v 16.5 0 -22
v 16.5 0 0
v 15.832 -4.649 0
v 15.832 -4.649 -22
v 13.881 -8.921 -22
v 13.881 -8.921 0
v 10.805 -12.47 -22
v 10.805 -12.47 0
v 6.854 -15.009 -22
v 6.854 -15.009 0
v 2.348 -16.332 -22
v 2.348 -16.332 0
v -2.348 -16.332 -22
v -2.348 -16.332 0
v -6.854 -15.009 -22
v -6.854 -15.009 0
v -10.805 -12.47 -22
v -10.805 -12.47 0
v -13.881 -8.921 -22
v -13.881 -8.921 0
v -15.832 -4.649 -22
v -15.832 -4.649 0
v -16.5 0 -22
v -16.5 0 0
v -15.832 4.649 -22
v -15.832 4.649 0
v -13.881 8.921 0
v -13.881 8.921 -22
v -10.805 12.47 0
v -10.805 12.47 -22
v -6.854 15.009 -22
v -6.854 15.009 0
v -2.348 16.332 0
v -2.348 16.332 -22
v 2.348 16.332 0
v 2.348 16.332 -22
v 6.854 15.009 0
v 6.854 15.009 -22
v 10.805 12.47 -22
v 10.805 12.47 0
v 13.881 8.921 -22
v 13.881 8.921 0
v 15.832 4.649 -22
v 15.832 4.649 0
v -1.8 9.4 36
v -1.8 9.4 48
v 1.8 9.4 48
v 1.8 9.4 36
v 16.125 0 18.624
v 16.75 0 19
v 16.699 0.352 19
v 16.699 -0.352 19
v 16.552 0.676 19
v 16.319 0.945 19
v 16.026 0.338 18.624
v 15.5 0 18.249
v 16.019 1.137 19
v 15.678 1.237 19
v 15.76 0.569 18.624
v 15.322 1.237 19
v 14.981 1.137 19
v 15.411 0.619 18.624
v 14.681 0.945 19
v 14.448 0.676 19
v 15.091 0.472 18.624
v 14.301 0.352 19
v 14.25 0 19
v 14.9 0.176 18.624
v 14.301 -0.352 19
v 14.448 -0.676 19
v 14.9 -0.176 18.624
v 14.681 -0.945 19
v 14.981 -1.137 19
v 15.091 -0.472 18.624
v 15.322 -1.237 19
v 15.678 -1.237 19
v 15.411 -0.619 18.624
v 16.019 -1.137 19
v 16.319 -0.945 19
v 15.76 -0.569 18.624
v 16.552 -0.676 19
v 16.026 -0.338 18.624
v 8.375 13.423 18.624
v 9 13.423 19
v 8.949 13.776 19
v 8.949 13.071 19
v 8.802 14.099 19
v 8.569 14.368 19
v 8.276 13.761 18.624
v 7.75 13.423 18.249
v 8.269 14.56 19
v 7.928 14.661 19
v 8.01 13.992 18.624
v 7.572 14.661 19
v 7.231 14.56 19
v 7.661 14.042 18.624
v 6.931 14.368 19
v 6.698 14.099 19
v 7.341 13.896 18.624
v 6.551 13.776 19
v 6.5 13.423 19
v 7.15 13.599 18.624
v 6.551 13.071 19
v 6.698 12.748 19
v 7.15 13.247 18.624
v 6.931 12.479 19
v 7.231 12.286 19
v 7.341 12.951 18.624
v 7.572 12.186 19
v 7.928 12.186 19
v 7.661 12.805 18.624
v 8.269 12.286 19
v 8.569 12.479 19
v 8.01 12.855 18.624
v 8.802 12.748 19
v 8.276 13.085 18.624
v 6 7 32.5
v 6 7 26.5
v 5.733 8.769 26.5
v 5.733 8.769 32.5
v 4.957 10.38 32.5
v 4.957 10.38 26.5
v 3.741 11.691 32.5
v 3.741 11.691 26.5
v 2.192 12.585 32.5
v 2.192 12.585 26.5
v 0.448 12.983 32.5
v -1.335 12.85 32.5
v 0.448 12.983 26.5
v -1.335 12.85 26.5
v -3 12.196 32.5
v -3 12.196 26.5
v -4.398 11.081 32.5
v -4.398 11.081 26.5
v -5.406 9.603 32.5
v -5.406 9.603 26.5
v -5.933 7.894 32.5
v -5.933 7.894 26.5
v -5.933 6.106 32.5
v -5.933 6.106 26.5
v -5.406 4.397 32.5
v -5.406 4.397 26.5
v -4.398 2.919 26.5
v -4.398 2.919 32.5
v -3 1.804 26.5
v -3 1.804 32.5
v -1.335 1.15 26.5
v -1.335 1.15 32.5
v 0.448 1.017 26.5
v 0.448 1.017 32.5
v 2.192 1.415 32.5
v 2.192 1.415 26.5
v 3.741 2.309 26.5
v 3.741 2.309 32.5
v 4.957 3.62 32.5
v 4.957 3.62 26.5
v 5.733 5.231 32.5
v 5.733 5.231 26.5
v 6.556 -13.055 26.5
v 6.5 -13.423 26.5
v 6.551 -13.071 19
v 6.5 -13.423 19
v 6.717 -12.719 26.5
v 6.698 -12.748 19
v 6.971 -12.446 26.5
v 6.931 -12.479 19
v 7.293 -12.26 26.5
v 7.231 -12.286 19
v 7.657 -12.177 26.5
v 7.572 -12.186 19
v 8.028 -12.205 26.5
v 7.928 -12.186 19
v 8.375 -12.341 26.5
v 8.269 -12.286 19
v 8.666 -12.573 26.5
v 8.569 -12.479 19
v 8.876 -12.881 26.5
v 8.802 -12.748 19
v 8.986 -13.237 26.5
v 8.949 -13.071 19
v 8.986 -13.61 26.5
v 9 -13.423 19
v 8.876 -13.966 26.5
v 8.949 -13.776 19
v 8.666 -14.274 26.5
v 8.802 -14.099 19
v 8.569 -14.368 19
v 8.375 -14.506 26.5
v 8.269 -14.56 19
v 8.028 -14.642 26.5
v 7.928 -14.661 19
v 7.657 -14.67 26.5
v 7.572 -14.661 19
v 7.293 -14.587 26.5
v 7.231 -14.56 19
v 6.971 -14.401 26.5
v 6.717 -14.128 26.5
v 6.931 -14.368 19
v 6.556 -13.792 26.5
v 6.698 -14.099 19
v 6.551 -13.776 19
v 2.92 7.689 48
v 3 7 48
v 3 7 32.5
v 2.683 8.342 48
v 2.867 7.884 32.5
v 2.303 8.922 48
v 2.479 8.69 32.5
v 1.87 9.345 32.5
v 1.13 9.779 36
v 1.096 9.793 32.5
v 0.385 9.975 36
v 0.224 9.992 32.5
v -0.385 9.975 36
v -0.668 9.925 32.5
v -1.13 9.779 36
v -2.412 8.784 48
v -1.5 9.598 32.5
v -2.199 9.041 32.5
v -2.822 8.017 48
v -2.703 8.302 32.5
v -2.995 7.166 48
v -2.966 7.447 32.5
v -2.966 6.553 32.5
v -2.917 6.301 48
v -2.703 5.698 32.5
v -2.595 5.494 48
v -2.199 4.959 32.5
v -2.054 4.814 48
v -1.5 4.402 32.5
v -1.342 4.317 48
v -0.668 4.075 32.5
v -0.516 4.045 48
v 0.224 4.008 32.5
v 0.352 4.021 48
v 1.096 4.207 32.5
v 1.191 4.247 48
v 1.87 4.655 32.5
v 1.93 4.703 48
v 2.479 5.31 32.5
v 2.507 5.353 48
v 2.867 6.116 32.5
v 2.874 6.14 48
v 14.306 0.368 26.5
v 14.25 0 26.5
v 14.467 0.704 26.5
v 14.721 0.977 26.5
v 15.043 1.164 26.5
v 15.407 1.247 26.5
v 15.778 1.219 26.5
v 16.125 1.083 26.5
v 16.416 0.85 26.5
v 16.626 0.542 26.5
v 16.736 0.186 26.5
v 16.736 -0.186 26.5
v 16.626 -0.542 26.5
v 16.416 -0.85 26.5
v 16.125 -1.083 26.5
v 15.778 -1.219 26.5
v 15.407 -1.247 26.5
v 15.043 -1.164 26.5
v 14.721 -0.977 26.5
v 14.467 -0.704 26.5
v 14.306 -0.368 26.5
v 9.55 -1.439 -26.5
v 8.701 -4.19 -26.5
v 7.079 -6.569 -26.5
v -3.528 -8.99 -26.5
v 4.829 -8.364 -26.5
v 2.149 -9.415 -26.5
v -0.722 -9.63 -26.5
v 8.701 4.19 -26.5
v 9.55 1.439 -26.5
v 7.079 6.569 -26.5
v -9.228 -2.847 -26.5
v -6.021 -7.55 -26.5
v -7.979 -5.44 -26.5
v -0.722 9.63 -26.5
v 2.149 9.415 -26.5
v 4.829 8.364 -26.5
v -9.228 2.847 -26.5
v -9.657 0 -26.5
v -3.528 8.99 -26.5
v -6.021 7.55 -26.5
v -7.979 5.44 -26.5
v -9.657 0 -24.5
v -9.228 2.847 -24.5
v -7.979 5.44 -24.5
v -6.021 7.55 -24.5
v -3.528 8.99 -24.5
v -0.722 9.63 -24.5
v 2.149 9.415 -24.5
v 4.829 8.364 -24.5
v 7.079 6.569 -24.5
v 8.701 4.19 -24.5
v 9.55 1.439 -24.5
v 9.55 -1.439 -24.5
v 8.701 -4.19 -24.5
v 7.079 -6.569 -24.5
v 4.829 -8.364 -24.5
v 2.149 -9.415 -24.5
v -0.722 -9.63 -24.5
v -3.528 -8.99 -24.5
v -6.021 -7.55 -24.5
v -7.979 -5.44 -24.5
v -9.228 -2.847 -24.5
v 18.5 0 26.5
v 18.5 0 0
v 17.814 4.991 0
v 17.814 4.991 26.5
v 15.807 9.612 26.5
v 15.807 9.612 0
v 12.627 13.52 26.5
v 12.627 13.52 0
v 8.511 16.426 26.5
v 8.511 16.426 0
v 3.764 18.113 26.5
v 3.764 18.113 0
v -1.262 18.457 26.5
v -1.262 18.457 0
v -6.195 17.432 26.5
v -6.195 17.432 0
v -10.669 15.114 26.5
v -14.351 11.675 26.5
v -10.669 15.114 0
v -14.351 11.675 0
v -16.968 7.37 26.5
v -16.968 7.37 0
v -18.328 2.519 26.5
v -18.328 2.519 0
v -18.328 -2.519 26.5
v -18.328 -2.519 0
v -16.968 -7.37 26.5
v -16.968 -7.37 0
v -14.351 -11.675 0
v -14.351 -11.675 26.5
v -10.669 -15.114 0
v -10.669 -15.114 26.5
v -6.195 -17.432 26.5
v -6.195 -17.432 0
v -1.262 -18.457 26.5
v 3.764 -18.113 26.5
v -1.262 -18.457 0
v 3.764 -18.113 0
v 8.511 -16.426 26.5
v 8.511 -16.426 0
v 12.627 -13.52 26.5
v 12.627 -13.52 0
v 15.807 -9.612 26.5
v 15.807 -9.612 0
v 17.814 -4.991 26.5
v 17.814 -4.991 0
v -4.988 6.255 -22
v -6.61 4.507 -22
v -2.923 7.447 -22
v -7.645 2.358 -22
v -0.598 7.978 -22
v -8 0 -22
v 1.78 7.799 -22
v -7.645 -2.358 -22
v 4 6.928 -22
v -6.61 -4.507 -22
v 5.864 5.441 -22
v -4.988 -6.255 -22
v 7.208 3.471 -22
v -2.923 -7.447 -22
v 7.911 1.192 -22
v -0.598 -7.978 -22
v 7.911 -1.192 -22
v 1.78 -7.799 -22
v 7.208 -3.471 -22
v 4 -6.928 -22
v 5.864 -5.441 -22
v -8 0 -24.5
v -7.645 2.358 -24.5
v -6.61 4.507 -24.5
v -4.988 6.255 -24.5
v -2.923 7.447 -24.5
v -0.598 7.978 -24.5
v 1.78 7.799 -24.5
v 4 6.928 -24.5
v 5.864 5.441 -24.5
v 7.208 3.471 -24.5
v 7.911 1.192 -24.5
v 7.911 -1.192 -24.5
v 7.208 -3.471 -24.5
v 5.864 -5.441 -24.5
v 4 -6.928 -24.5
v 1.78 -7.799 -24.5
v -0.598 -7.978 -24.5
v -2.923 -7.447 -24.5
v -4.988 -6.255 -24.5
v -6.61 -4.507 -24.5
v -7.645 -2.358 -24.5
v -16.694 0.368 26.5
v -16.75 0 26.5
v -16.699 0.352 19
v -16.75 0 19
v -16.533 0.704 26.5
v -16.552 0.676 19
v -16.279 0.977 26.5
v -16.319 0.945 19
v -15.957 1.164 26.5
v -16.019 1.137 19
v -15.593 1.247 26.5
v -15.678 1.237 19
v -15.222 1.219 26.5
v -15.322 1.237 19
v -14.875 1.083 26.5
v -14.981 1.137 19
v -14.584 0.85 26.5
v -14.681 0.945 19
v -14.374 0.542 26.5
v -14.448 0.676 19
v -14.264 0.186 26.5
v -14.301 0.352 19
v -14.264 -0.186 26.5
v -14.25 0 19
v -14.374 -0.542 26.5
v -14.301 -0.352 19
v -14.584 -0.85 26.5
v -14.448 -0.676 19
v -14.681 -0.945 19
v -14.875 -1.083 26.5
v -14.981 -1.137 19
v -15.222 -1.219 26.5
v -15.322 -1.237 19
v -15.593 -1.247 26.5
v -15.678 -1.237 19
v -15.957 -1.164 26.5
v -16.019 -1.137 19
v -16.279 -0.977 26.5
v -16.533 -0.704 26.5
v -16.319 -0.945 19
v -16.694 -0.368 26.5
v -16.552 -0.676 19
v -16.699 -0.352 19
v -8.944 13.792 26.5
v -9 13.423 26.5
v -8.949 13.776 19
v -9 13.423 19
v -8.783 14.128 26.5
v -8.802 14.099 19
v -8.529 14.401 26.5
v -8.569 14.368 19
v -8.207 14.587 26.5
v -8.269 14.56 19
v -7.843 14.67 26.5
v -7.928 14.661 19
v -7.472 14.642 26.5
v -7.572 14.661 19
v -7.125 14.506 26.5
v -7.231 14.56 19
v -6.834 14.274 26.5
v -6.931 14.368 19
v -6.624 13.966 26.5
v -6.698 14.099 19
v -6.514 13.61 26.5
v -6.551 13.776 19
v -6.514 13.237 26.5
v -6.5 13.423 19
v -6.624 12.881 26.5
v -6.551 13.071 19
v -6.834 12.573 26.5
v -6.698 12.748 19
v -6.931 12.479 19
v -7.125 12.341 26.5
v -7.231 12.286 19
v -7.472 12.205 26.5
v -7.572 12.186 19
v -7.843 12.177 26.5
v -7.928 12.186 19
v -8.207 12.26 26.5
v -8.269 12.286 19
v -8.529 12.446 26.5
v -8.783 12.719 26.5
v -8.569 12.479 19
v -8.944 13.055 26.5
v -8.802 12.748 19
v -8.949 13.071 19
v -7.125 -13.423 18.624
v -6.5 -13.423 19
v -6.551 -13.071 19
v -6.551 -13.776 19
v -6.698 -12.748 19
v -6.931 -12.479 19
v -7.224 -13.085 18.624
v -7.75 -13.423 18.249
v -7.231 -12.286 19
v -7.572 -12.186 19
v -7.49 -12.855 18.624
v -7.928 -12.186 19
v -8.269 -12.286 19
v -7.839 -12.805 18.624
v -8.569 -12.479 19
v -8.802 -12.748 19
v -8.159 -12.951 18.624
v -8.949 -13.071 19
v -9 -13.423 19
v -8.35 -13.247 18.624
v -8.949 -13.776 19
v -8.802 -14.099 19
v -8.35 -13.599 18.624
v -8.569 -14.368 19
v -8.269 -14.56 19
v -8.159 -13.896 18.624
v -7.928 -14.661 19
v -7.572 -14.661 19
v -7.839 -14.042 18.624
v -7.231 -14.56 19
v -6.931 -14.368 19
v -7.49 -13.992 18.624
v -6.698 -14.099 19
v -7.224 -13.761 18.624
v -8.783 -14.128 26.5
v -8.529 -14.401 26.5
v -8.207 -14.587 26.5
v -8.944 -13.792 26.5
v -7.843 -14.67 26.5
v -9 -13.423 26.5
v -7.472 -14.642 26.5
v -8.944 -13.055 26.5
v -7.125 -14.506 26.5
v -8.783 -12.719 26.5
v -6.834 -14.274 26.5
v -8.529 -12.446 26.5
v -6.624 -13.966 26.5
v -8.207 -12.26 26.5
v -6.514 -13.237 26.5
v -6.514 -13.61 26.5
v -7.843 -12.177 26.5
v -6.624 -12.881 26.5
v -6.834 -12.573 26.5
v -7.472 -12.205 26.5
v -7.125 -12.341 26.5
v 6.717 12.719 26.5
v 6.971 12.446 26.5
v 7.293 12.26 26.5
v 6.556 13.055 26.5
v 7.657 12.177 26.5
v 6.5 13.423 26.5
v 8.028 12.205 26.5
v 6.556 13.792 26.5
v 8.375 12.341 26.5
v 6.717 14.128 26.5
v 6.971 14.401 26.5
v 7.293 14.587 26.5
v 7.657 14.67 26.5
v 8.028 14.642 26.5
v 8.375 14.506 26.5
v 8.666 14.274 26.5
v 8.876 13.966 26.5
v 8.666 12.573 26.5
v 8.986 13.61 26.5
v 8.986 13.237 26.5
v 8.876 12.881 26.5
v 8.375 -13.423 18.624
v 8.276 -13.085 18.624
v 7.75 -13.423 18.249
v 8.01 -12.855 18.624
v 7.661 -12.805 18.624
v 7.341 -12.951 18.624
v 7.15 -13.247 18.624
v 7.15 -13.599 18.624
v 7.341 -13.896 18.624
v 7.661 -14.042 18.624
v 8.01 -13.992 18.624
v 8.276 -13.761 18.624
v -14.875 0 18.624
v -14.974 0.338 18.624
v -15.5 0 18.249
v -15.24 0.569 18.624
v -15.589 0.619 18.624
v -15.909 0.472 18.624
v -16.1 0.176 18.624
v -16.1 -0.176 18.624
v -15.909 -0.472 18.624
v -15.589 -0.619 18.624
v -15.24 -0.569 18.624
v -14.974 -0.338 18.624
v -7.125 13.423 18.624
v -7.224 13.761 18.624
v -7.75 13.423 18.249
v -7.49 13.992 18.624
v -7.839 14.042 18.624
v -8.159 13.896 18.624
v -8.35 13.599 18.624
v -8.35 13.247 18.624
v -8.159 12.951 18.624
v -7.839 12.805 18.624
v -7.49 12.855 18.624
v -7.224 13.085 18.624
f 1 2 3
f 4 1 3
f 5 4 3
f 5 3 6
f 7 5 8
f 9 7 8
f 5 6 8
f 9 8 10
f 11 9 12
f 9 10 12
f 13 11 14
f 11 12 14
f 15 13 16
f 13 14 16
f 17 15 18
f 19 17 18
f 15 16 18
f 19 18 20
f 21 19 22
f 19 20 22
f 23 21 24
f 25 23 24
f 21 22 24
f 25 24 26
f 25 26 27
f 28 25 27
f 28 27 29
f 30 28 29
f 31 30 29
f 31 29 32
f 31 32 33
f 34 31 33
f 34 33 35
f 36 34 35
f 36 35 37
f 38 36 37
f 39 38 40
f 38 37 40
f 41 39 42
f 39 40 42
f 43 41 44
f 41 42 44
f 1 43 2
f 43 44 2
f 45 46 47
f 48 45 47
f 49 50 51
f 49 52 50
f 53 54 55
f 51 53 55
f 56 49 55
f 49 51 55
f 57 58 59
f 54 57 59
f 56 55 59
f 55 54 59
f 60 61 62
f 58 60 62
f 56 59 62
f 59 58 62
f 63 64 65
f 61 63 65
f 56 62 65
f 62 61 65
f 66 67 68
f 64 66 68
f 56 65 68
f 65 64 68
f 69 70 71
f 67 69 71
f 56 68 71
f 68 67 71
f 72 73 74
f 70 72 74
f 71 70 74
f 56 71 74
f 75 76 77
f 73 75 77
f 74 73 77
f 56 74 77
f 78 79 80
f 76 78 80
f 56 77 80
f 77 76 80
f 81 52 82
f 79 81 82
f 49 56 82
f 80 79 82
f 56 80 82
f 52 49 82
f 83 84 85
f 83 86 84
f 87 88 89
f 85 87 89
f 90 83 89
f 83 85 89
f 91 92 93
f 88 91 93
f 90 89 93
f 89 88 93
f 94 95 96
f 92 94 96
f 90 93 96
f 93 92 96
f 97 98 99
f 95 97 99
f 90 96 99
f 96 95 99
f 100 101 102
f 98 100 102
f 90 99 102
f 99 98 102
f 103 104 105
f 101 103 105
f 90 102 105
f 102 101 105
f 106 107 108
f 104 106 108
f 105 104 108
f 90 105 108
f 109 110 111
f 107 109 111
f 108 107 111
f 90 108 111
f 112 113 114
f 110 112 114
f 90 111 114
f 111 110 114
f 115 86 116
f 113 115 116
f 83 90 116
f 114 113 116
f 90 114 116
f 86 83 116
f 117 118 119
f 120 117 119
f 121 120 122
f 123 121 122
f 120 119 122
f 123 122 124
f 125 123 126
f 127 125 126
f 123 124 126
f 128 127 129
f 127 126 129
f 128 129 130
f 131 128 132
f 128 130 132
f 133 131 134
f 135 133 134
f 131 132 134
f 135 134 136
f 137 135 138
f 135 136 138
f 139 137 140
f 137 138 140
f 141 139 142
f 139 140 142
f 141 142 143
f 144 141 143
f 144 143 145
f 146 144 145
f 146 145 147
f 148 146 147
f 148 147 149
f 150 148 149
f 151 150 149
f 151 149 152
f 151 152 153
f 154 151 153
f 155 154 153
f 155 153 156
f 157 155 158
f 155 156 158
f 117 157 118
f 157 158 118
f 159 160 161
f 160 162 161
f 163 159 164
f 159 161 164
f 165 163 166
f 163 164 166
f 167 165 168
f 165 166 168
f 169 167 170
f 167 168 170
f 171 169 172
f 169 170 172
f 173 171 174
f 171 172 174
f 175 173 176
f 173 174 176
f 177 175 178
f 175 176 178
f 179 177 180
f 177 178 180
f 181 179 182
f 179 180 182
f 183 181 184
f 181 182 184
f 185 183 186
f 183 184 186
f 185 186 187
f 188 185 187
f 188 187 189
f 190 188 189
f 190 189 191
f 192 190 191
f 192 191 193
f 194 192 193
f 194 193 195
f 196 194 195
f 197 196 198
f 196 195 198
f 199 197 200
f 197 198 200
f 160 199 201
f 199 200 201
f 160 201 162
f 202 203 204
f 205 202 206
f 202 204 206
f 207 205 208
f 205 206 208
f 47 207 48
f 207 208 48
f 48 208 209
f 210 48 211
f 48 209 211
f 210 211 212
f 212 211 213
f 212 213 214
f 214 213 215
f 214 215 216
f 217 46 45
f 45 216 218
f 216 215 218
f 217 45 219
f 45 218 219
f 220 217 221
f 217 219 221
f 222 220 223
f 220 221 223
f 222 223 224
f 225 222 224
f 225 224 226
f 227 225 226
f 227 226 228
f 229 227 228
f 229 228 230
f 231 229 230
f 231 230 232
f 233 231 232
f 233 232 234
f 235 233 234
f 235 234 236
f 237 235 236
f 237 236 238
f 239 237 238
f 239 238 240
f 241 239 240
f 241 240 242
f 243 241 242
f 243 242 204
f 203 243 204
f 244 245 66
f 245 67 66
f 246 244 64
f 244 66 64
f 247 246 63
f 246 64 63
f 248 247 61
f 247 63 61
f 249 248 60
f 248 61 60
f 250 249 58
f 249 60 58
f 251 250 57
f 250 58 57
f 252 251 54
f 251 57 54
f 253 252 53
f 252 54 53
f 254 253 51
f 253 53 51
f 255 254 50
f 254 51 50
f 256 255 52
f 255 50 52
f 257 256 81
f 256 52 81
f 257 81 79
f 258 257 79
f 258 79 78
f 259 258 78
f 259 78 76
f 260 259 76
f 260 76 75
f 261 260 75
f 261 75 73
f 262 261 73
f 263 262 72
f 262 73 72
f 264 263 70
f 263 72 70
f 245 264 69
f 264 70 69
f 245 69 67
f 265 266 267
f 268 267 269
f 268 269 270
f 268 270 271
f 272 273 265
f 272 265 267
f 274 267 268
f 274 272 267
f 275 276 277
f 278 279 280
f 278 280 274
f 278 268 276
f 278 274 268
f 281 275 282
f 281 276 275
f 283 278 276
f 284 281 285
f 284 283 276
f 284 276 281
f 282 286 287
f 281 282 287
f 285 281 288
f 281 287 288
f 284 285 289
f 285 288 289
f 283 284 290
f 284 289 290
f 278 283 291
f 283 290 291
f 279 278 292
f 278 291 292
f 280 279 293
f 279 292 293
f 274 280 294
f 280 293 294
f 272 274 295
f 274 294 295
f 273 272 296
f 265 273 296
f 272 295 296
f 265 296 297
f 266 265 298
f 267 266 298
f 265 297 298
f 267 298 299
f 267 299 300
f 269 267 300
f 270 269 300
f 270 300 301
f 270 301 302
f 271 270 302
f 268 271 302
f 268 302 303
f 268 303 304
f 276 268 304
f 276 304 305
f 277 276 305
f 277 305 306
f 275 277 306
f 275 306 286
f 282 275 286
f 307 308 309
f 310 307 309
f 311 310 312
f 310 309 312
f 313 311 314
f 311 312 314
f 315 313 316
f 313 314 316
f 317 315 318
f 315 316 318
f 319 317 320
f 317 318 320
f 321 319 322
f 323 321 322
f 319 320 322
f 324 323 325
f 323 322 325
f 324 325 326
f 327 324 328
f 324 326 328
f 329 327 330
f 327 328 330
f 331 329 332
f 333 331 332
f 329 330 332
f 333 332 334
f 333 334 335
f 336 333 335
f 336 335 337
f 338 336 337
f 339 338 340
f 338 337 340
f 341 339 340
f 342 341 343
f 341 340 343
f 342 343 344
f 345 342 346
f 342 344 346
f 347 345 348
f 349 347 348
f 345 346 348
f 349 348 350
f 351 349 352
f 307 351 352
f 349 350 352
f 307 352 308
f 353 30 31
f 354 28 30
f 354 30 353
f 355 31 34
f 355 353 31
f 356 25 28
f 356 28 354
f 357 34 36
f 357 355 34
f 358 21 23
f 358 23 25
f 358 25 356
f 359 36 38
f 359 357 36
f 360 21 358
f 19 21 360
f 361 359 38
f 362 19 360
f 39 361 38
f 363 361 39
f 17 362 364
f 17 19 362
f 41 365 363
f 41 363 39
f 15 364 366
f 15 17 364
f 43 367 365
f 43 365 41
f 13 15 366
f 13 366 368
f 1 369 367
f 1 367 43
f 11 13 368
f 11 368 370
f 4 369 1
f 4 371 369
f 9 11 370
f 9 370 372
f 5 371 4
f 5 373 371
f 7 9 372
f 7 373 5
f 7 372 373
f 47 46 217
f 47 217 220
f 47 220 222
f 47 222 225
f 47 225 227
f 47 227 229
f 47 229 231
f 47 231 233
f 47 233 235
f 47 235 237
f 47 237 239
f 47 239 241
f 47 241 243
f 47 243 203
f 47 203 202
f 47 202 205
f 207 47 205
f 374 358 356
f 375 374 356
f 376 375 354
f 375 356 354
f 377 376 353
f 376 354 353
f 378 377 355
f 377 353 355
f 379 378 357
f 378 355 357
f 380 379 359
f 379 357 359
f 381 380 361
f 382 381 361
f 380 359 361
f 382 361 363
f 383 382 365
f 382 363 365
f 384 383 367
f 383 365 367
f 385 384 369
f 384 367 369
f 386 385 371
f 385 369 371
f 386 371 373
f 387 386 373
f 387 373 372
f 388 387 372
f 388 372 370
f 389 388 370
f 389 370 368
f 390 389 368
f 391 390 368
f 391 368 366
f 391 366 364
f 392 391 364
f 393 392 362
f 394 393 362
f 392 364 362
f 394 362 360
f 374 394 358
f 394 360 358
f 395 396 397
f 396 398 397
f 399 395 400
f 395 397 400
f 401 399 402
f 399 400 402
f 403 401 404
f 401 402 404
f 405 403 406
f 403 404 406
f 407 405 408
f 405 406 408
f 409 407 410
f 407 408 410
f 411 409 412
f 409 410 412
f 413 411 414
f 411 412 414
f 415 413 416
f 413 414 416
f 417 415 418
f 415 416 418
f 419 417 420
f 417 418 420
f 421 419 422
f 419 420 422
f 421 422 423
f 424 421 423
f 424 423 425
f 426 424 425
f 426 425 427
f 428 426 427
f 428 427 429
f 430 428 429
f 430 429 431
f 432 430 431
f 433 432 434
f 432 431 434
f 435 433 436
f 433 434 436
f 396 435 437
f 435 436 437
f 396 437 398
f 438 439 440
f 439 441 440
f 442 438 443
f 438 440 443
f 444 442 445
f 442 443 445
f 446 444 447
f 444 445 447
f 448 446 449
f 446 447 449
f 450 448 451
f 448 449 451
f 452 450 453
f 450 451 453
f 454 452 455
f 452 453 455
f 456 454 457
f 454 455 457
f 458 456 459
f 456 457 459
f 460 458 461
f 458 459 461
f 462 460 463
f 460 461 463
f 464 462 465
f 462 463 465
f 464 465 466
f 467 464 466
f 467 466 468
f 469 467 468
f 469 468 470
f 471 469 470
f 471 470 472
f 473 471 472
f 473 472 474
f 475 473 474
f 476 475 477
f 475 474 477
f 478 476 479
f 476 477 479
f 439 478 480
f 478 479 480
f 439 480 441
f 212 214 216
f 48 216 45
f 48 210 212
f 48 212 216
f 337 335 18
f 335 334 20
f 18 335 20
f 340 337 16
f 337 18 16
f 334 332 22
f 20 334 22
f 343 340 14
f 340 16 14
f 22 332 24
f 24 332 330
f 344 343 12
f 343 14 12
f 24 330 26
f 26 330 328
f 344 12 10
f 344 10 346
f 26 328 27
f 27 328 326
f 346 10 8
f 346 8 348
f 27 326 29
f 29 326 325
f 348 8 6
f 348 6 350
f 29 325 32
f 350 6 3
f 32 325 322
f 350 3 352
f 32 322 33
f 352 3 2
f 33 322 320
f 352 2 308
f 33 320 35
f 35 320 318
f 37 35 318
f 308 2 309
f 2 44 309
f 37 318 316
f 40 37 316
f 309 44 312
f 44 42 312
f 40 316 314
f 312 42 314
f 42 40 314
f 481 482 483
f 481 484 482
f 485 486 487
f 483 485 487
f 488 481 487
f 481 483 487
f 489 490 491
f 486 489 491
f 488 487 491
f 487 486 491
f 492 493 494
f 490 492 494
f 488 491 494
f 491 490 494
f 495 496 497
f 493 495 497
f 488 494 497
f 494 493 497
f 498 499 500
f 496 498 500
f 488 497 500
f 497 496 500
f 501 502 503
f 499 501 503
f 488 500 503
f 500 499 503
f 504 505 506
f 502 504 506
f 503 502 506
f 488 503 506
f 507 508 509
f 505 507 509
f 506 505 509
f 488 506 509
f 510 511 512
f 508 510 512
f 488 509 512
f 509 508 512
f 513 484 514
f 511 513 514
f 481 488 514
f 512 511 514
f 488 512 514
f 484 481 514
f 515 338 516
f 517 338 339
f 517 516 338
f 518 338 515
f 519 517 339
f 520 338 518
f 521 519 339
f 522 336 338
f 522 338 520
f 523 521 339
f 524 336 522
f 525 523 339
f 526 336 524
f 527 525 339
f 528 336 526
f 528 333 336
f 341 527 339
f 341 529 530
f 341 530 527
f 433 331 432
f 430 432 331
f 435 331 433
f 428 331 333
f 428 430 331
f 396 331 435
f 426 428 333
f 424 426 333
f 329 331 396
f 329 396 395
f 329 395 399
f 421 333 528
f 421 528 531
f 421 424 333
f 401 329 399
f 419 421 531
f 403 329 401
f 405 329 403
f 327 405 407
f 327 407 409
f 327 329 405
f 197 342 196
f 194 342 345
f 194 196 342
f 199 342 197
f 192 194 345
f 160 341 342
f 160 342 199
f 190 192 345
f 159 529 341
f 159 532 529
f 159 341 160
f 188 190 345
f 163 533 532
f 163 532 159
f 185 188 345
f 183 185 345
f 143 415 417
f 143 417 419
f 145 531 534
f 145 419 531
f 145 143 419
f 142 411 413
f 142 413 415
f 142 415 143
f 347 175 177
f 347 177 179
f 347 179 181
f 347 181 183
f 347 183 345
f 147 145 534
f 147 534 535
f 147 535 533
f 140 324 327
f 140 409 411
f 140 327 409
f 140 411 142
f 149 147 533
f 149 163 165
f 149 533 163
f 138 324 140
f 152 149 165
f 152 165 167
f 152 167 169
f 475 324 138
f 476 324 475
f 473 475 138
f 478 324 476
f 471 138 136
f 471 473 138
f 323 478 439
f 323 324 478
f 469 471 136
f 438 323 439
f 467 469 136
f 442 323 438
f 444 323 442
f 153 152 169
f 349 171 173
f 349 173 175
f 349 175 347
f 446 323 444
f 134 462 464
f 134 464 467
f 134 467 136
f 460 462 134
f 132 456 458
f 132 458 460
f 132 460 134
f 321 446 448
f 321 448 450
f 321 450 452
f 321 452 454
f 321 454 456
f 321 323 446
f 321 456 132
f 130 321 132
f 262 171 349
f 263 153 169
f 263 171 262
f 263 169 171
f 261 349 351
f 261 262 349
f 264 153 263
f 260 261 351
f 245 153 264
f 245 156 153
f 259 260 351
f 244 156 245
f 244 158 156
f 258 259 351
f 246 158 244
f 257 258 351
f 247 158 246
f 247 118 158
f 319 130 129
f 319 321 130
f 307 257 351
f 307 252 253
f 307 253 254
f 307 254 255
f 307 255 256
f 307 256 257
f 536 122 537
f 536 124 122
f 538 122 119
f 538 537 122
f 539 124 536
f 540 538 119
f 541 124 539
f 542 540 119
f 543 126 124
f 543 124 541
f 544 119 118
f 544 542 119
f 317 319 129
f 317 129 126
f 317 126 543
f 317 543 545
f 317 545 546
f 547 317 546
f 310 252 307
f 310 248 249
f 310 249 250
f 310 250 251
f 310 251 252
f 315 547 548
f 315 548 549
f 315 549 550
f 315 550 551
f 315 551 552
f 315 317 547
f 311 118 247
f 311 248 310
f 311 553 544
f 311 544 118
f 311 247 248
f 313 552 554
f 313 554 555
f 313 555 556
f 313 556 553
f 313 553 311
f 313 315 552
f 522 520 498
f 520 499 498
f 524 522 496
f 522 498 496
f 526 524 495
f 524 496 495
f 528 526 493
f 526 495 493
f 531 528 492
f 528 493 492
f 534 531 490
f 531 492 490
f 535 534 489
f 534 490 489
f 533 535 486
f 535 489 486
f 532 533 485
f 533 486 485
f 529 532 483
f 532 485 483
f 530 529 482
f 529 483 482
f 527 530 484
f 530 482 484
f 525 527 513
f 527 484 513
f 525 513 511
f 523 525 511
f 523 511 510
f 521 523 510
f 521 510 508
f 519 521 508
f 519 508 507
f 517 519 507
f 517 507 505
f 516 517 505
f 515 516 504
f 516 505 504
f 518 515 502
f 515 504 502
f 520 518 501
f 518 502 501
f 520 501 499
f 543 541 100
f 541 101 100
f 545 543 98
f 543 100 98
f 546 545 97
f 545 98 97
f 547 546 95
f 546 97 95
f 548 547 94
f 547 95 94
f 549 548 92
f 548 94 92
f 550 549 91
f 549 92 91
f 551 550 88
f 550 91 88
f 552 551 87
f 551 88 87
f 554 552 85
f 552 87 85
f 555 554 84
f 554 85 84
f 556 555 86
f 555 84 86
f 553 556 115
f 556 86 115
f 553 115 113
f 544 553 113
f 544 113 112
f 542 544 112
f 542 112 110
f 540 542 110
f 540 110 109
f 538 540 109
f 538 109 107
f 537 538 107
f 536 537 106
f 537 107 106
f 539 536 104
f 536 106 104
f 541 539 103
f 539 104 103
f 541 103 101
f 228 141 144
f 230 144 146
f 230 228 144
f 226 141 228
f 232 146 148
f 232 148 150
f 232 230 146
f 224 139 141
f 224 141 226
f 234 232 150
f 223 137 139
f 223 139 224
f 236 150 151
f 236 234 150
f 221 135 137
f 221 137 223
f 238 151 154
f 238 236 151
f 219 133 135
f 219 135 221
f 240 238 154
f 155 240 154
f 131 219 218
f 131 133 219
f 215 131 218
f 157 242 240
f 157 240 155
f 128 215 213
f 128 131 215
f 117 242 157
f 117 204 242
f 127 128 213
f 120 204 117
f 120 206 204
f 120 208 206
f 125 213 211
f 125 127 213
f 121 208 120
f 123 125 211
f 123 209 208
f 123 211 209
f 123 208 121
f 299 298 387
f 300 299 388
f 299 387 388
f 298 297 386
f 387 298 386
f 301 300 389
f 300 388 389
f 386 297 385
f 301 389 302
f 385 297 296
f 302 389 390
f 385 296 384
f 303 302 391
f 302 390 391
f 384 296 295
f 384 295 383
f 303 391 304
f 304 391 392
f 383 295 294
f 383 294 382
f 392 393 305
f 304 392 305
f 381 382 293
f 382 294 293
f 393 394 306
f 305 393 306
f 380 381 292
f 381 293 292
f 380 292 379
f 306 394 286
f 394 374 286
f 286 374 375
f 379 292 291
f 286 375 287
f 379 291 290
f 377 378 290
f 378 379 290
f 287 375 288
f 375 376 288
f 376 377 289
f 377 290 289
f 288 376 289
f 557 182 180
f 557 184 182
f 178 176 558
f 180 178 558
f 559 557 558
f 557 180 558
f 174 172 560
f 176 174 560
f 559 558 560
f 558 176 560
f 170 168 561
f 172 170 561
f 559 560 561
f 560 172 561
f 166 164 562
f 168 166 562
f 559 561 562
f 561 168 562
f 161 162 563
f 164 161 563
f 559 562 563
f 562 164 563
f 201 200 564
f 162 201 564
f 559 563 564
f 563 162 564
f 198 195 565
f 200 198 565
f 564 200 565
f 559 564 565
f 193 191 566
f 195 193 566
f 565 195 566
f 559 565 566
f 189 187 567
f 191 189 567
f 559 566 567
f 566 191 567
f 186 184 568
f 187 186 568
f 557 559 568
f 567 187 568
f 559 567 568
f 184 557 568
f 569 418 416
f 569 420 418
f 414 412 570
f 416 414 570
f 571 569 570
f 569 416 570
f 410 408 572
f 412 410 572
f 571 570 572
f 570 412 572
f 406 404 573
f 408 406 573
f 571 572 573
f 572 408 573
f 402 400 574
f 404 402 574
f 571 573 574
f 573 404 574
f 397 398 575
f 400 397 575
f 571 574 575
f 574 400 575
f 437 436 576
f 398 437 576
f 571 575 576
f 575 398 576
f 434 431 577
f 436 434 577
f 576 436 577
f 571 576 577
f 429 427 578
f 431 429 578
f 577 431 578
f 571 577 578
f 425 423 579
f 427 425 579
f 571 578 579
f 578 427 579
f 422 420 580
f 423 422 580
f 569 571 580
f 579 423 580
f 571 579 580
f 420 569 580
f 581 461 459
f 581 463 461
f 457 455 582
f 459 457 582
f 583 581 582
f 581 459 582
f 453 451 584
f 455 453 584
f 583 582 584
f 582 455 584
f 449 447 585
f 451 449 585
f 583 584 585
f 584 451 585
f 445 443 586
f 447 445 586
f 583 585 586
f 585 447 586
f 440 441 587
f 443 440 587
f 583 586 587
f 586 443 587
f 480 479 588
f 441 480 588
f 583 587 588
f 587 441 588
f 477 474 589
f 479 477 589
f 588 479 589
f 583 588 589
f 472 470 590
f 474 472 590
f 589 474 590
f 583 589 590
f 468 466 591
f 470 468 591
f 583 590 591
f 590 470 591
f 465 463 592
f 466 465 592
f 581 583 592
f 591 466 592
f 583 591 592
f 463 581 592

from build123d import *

# Parameters (mm, degrees)
SKETCH_1_R             = 18.5
EXTRUDE_1_DEPTH        = 26.5
SKETCH_2_R             = 6
EXTRUDE_2_DEPTH        = 6
SKETCH_3_R             = 3
EXTRUDE_3_DEPTH        = 15.5
SKETCH_4_W             = 6.445073496
SKETCH_4_H             = 1.792044826
CUT_EXTRUDE_1_DEPTH    = 12
SKETCH_5_R             = 16.5
EXTRUDE_4_DEPTH        = 22
HOLE_WIZARD_M3_1_D     = 2.5
HOLE_WIZARD_M3_1_DEPTH = 7.5
HOLE_WIZARD_M3_1_TIP   = 0.751075774
SKETCH_8_R             = 14
EXTRUDE_5_DEPTH        = 4.5
CUT_EXTRUDE_START      = -2.5
SKETCH_9_R             = 14
SKETCH_9_R_2           = 8
CUT_EXTRUDE_2_DEPTH    = 2.5
CUT_EXTRUDE_START_2    = -3
SKETCH_10_R            = 14
SKETCH_10_R_2          = 9.657403228
CUT_EXTRUDE_3_DEPTH    = 3


with BuildPart() as part:
    # 草图1 → 凸台-拉伸1 (new body)
    with BuildSketch(Plane.XY):
        Circle(SKETCH_1_R)
    extrude(amount=EXTRUDE_1_DEPTH)

    # 草图2 → 凸台-拉伸2 (add)
    with BuildSketch(Plane.XY.offset(26.5)):
        with Locations((0, 7)):
            Circle(SKETCH_2_R)
    extrude(amount=EXTRUDE_2_DEPTH)

    # 草图3 → 凸台-拉伸3 (add)
    with BuildSketch(Plane.XY.offset(32.5)):
        with Locations((0, 7)):
            Circle(SKETCH_3_R)
    extrude(amount=EXTRUDE_3_DEPTH)

    # 草图4 → 切除-拉伸1 (cut)
    with BuildSketch(Plane.XY.offset(48)):
        with Locations((0.299511506, 10.296022413)):
            Rectangle(SKETCH_4_W, SKETCH_4_H)
    extrude(amount=-CUT_EXTRUDE_1_DEPTH, mode=Mode.SUBTRACT)

    # 草图5 → 凸台-拉伸4 (add)
    with BuildSketch(Plane(origin=(0, 0, 0), x_dir=(-1, 0, 0), z_dir=(0, 0, -1))):
        with Locations(Location((0, 0, 0), (0, 0, 180))):
            Circle(SKETCH_5_R)
    extrude(amount=EXTRUDE_4_DEPTH)

    # M3 螺纹孔1
    with Locations(Plane(origin=(-7.75, 13.423393759, 26.5), x_dir=(1, 0, 0), z_dir=(0, 0, 1))):
        with Locations((0, 0), (15.5, 0), (23.25, -13.423393759), (15.5, -26.846787518), (0, -26.846787518), (-7.75, -13.423393759)):
            Hole(HOLE_WIZARD_M3_1_D / 2, depth=HOLE_WIZARD_M3_1_DEPTH)
            with Locations((0, 0, -(HOLE_WIZARD_M3_1_DEPTH + HOLE_WIZARD_M3_1_TIP / 2))):  # 118° drill point
                Cone(0, HOLE_WIZARD_M3_1_D / 2, HOLE_WIZARD_M3_1_TIP, mode=Mode.SUBTRACT)

    # 草图8 → 凸台-拉伸5 (add)
    with BuildSketch(Plane(origin=(0, 0, -22), x_dir=(-1, 0, 0), z_dir=(0, 0, -1))):
        Circle(SKETCH_8_R)
    extrude(amount=EXTRUDE_5_DEPTH)

    # 草图9 → 切除-拉伸2 (cut)
    with BuildSketch(Plane(origin=(0, 0, -24.5), x_dir=(-1, 0, 0), z_dir=(0, 0, -1)).offset(CUT_EXTRUDE_START)):
        Circle(SKETCH_9_R)
        Circle(SKETCH_9_R_2, mode=Mode.SUBTRACT)
    extrude(amount=CUT_EXTRUDE_2_DEPTH, mode=Mode.SUBTRACT)

    # 草图10 → 切除-拉伸3 (cut)
    with BuildSketch(Plane(origin=(0, 0, -26.5), x_dir=(-1, 0, 0), z_dir=(0, 0, -1)).offset(CUT_EXTRUDE_START_2)):
        Circle(SKETCH_10_R)
        Circle(SKETCH_10_R_2, mode=Mode.SUBTRACT)
    extrude(amount=CUT_EXTRUDE_3_DEPTH, mode=Mode.SUBTRACT)


solid = part.part
